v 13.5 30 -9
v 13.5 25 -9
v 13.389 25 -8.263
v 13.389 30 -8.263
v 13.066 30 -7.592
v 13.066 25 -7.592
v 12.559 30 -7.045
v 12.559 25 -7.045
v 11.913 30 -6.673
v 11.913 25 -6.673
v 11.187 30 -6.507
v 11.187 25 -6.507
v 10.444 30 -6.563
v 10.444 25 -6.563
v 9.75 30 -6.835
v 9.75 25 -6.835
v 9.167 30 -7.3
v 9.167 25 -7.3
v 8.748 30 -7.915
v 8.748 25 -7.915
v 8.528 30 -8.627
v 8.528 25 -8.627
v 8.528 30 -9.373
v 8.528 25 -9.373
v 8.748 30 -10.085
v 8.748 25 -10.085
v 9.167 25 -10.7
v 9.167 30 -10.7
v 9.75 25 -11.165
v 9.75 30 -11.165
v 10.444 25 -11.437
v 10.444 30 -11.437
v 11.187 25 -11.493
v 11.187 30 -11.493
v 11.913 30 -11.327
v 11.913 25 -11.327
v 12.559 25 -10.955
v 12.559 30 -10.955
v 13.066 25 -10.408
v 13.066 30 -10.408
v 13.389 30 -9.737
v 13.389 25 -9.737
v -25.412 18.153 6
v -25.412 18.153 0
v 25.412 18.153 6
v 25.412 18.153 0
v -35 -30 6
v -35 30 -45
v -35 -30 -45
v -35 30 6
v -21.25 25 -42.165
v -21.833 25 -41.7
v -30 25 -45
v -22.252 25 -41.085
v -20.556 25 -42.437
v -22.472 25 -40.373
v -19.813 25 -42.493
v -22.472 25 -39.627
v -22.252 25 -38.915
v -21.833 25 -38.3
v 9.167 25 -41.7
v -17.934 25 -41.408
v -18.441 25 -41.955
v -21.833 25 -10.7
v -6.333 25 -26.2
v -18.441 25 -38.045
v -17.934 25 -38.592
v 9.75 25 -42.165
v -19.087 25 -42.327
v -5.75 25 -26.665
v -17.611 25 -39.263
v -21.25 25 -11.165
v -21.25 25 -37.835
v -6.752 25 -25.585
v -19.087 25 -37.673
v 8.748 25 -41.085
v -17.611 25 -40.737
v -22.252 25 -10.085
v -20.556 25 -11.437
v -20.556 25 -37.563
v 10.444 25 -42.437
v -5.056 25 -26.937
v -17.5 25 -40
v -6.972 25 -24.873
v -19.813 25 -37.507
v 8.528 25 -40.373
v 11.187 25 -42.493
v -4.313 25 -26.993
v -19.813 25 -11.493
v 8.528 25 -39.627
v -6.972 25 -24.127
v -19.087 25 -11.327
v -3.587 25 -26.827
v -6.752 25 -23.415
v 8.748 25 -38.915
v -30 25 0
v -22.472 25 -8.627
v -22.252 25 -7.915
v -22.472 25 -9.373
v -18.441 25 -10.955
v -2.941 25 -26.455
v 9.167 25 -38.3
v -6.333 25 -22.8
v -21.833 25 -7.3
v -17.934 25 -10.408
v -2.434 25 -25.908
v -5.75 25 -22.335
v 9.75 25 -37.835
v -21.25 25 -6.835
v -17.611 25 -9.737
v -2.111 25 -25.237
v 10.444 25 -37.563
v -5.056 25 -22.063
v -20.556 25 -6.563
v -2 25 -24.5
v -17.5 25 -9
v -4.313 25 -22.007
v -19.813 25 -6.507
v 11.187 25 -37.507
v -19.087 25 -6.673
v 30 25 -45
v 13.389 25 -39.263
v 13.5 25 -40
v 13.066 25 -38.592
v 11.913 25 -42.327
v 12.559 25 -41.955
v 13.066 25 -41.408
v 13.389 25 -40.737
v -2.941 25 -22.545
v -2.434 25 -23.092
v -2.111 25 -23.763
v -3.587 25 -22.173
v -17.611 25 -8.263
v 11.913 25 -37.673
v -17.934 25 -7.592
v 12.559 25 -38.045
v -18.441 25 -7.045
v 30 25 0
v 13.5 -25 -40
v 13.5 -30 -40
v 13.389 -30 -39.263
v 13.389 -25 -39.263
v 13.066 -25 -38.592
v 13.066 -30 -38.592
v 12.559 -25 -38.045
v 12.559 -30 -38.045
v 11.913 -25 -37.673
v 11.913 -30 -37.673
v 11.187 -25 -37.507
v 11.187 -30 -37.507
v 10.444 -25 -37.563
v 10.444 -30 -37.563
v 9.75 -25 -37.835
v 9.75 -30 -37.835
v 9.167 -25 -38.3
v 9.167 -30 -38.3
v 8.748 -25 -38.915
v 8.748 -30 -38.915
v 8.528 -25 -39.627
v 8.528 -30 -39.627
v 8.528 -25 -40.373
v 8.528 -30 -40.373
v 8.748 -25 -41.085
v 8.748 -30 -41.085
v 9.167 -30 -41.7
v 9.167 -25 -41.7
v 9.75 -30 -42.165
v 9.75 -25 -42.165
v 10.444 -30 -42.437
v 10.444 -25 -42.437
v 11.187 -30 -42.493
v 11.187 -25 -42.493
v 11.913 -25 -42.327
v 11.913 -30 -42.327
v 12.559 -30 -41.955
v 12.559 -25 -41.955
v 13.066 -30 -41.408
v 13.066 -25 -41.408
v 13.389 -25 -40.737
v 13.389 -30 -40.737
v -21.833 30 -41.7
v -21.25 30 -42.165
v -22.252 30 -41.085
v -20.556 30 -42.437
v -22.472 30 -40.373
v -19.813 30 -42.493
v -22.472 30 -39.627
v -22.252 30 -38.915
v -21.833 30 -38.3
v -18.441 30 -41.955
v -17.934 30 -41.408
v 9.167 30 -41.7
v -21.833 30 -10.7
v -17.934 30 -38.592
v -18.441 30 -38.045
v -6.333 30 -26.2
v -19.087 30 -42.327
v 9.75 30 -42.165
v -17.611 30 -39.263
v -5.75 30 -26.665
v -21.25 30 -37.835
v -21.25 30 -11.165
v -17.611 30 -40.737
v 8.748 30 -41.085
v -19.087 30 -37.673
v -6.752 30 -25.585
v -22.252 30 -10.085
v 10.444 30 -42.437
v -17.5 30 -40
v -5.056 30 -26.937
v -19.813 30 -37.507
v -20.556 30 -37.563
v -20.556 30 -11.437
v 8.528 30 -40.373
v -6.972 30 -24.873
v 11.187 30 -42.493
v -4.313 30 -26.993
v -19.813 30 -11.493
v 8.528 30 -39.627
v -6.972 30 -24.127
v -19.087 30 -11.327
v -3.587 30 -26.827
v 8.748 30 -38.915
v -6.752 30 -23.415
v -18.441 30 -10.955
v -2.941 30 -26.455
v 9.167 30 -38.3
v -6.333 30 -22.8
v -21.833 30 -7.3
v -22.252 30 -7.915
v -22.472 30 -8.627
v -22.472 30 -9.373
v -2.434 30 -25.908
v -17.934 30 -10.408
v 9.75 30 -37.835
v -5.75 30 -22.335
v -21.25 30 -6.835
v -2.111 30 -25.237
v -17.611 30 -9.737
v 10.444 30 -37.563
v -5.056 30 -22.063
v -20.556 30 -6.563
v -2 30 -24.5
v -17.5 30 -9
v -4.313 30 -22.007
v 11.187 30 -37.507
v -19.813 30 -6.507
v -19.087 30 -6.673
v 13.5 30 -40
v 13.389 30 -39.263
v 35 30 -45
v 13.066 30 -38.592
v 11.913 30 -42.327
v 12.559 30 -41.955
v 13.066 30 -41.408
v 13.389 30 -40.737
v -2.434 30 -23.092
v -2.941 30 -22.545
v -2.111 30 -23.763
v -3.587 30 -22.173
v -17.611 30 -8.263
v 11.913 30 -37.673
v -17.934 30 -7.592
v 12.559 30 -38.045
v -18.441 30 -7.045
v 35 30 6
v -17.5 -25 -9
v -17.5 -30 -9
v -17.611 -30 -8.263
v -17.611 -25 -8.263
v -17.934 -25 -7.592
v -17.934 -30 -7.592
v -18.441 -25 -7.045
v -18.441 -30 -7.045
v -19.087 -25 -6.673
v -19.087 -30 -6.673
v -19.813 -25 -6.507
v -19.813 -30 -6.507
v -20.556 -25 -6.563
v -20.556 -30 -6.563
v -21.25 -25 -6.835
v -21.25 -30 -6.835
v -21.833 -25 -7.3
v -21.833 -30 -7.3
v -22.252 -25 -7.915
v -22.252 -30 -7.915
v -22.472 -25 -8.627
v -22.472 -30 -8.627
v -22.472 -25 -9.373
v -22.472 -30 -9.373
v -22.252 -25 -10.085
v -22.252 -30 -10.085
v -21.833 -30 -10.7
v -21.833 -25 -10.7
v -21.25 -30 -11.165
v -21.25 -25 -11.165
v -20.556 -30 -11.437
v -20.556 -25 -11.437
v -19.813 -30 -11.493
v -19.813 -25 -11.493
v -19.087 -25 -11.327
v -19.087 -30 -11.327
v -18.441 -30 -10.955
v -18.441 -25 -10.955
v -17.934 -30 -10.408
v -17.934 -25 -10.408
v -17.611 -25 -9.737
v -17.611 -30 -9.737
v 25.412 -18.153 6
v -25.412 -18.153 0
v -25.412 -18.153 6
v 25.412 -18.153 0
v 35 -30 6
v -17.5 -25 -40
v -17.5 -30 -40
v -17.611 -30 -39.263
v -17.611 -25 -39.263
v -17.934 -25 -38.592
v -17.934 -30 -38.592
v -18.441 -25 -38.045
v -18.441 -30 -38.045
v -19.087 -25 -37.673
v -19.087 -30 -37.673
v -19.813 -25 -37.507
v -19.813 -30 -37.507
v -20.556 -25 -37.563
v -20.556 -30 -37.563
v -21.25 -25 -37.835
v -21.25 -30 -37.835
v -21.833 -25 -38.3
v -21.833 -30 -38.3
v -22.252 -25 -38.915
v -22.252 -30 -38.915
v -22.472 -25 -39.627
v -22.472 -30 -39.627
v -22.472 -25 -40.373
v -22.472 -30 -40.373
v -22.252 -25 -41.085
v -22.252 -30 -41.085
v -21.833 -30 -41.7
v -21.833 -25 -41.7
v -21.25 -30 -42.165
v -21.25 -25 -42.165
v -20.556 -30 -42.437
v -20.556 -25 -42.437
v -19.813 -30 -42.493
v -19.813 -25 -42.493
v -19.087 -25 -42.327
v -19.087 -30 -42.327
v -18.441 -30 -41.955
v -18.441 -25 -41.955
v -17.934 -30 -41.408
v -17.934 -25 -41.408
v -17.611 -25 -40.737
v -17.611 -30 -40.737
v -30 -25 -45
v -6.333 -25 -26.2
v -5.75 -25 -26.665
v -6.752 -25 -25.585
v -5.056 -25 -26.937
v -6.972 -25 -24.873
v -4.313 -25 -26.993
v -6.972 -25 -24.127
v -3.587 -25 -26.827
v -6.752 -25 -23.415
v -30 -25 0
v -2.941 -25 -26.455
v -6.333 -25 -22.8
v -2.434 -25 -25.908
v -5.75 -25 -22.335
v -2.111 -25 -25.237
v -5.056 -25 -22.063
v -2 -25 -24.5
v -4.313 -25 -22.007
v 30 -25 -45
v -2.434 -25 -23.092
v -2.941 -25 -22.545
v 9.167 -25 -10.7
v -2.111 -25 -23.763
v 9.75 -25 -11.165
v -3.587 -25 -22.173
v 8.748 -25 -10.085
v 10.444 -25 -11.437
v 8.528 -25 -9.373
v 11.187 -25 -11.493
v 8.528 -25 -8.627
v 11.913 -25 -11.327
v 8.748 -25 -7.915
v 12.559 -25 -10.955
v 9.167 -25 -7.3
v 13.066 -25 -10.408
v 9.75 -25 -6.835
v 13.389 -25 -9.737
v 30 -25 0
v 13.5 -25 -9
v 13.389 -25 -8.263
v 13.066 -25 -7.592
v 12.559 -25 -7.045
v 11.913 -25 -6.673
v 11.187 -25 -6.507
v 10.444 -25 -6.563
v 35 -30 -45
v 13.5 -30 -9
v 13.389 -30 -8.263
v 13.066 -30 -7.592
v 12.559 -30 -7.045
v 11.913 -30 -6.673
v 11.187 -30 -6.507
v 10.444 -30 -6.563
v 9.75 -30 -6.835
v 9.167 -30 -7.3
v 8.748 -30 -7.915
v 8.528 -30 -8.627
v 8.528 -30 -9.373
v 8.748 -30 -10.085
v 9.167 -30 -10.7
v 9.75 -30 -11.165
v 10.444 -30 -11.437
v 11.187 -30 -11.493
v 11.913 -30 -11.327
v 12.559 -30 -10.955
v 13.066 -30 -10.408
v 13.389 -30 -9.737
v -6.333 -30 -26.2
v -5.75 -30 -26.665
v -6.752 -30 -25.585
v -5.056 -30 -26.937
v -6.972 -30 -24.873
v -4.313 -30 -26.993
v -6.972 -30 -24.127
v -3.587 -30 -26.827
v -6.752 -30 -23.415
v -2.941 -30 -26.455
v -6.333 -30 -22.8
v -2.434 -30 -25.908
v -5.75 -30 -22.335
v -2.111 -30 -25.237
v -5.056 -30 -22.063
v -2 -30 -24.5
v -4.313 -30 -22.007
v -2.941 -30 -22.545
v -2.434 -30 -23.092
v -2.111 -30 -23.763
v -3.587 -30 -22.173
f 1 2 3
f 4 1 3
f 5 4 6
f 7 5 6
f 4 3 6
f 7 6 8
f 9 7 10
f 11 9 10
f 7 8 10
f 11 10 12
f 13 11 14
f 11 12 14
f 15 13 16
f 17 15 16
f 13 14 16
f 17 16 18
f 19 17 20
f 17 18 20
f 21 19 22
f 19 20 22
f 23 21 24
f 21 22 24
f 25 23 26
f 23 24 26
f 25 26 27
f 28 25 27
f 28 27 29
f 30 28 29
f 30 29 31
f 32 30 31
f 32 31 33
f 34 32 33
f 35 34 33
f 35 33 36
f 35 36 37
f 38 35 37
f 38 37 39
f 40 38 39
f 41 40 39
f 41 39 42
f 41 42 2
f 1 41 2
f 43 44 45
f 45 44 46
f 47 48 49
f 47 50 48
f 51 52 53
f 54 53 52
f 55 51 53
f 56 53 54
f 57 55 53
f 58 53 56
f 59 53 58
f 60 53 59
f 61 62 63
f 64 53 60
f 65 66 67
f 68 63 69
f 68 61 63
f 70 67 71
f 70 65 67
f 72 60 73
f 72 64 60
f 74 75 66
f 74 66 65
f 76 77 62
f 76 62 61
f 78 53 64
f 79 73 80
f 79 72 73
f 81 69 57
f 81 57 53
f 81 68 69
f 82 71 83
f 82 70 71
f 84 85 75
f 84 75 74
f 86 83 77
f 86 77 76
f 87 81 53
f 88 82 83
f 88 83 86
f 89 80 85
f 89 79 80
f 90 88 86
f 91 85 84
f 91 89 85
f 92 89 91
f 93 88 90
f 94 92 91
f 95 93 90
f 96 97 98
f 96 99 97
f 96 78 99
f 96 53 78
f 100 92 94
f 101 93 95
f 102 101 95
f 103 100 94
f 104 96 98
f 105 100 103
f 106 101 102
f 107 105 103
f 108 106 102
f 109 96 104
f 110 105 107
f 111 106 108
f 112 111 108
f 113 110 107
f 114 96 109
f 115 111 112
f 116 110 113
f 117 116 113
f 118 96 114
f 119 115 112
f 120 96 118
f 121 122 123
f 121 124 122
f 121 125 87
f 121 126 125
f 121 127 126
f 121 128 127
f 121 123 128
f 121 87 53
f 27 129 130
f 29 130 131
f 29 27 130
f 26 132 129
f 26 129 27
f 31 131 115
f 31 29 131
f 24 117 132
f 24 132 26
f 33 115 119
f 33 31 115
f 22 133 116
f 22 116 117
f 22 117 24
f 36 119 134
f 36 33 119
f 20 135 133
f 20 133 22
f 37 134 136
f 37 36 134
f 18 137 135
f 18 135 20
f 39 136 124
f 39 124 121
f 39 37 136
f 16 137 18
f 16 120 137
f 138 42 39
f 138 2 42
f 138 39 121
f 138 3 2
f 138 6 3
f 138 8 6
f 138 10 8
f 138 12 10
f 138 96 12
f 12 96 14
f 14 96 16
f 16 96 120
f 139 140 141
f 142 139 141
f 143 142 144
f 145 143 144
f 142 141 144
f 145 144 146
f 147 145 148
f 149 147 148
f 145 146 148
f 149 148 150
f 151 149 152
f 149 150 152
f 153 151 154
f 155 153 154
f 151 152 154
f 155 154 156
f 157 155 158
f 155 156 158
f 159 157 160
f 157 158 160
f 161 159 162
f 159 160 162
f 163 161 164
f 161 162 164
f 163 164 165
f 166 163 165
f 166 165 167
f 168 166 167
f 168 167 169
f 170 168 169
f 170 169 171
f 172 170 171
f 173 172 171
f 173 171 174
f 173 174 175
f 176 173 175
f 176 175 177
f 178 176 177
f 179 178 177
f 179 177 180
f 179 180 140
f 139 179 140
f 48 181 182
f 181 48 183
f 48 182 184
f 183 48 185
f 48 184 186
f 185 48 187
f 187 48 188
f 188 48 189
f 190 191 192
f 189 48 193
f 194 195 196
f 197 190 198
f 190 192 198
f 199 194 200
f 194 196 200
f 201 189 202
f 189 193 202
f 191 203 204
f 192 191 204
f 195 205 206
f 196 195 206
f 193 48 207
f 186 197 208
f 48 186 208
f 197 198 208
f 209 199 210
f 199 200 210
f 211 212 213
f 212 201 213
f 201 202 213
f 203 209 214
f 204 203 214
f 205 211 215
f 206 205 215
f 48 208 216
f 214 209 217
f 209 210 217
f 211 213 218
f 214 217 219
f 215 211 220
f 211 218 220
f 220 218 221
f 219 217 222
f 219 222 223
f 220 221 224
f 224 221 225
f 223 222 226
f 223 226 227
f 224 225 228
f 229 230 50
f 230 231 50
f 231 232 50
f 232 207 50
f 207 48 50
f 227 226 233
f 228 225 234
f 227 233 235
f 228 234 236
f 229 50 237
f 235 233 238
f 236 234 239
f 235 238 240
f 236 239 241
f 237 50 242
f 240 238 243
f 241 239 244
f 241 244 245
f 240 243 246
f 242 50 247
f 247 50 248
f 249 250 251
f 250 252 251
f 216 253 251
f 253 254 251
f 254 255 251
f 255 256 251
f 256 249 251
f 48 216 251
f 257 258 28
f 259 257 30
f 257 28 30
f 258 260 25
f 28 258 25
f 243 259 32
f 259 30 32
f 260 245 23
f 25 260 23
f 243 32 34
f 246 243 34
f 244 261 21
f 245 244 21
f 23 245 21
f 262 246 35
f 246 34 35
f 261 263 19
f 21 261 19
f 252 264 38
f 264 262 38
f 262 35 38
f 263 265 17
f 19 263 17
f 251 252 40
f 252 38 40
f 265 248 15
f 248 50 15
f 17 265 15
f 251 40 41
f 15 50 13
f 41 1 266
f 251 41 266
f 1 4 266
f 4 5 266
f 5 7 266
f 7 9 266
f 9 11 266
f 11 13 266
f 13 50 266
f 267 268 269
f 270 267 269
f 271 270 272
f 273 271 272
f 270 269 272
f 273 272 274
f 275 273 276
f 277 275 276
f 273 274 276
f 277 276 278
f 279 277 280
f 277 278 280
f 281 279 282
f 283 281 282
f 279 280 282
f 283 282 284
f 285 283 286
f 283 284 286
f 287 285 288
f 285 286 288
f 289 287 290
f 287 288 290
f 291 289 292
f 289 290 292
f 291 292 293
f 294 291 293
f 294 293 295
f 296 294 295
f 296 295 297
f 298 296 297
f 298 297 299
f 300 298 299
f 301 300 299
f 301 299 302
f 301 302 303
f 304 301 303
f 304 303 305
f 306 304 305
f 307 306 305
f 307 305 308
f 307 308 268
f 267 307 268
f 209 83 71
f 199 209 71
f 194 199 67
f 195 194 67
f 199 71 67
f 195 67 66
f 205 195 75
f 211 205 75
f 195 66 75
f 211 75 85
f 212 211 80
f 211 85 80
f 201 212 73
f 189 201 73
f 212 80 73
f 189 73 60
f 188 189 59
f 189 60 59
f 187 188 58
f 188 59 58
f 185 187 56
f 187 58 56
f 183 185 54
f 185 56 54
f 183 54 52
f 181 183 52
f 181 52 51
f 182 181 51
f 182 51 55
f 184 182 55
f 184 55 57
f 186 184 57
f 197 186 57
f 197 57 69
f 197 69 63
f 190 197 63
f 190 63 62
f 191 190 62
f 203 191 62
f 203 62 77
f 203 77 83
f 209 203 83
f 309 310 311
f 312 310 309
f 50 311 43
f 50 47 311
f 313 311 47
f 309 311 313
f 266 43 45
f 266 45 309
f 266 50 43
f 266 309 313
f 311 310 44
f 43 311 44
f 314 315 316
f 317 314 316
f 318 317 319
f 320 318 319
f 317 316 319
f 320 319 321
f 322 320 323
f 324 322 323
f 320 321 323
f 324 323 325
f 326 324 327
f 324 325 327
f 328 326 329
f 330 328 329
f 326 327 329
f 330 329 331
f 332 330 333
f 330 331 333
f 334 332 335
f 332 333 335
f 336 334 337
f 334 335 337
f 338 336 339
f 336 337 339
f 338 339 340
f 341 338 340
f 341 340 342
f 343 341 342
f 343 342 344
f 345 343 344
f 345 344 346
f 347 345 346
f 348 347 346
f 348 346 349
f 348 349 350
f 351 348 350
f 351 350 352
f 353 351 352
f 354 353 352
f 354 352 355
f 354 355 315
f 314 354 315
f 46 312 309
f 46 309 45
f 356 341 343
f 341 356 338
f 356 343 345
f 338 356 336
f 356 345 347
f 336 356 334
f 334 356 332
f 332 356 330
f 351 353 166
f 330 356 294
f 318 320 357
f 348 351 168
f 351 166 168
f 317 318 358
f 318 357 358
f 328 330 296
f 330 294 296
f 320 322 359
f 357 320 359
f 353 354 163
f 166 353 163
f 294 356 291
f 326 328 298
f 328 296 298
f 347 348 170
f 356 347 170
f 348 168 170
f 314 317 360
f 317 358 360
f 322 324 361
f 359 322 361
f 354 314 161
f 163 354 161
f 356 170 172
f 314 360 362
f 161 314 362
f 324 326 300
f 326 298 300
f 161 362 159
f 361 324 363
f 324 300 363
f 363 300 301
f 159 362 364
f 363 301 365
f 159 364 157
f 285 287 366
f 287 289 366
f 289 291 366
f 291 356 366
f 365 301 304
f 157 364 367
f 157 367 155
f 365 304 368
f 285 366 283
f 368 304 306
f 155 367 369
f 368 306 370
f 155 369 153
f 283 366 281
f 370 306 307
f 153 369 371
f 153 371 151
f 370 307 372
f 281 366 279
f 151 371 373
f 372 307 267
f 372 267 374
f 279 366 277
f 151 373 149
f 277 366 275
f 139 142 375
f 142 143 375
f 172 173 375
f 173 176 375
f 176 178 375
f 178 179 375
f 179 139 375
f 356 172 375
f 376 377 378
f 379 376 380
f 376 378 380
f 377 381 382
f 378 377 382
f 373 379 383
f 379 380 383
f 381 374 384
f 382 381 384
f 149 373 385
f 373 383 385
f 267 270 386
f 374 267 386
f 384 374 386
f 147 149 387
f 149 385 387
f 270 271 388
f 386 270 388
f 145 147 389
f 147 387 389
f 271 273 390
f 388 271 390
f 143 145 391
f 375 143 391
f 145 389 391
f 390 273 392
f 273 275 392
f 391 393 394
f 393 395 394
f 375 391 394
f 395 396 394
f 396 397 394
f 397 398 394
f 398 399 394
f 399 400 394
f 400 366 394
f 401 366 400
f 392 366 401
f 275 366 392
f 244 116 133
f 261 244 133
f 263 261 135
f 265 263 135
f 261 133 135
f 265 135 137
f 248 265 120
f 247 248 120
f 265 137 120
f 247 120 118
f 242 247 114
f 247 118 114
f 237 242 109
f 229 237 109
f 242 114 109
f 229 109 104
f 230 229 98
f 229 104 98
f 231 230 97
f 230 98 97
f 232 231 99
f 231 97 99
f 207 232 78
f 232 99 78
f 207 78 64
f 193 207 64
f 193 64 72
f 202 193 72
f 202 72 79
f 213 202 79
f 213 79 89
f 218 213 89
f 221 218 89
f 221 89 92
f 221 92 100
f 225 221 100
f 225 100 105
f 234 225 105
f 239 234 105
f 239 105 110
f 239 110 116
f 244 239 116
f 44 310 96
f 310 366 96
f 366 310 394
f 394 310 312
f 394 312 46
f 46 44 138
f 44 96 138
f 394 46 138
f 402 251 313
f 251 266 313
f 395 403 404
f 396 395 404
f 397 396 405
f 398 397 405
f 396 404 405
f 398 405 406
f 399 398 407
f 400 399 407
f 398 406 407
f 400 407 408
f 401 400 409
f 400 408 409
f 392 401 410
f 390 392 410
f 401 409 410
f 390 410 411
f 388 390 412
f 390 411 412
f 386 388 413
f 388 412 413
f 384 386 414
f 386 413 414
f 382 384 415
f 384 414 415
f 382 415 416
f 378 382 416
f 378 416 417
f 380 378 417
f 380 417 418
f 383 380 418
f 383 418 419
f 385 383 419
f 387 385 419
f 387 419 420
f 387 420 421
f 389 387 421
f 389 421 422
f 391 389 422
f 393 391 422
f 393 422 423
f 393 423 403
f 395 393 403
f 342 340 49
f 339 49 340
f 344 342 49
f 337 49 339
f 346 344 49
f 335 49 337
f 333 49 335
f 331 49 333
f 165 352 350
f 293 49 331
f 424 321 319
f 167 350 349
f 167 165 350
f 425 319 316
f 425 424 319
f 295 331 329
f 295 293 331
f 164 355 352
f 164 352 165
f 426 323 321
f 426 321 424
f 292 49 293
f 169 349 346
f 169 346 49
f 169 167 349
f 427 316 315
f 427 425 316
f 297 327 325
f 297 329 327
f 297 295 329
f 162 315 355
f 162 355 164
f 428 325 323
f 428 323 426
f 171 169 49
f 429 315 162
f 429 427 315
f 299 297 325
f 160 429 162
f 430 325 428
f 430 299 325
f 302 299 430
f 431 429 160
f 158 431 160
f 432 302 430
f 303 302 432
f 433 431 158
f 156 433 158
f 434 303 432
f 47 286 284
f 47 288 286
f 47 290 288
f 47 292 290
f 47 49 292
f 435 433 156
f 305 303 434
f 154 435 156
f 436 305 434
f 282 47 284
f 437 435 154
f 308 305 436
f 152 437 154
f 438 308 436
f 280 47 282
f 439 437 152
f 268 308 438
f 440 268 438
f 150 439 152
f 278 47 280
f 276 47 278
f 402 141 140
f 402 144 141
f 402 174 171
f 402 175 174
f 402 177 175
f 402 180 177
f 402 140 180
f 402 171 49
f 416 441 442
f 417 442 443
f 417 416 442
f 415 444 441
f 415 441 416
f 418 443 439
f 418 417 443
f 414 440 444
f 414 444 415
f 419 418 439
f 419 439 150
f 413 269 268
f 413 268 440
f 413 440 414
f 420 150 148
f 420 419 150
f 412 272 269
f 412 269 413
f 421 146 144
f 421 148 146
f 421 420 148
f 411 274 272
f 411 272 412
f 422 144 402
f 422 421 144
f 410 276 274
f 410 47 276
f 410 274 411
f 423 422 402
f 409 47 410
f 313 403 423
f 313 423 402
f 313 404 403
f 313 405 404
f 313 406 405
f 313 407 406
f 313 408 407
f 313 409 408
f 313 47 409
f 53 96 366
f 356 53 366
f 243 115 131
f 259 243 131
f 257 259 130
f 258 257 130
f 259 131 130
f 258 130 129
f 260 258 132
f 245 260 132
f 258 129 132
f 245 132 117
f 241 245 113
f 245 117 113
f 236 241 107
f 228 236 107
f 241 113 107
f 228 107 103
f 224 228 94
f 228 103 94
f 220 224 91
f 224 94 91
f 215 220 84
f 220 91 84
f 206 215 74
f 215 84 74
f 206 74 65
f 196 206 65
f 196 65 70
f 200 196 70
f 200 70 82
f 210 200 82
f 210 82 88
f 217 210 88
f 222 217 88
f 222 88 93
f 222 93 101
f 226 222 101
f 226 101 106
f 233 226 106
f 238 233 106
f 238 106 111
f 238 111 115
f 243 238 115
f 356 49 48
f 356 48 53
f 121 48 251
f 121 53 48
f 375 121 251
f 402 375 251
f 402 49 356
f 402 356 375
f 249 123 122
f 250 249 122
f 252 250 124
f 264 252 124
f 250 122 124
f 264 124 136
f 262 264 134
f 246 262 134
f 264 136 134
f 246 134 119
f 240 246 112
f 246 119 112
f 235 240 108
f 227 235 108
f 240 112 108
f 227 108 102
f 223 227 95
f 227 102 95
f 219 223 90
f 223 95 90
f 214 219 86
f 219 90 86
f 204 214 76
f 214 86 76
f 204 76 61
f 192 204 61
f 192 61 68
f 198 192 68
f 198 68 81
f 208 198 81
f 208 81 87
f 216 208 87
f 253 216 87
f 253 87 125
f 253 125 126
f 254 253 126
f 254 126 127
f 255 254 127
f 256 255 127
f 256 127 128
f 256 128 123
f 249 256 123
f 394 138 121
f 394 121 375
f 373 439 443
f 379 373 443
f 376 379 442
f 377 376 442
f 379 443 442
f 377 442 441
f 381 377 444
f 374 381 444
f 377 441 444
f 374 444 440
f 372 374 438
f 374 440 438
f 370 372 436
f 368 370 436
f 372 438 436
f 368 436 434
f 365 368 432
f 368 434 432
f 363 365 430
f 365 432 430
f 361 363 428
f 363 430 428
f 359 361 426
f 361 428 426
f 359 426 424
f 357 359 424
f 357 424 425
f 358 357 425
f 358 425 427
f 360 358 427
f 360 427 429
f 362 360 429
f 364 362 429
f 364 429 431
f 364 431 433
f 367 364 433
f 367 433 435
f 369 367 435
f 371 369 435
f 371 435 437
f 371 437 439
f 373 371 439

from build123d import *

# Parameters (mm, degrees)
F0_W     = 70
F0_H     = 60
F0_W_2   = 50.823688
F0_H_2   = 36.305584
F1_DEPTH = 6
F2_W     = 70
F2_H     = 60
F2_W_2   = 60
F2_H_2   = 50
F3_DEPTH = 45
F5_D     = 5


with BuildPart() as f1:
    # F0 (on Top) → F1 (new body)
    with BuildSketch(Plane.XY):
        Rectangle(F0_W, F0_H)
        Rectangle(F0_W_2, F0_H_2, mode=Mode.SUBTRACT)
    extrude(amount=F1_DEPTH)

    # F2 (on face) → F3 (join)
    with BuildSketch(Plane(origin=(0, 0, 0), x_dir=(1, 0, 0), z_dir=(0, 0, -1))):
        Rectangle(F2_W, F2_H)
        Rectangle(F2_W_2, F2_H_2, mode=Mode.SUBTRACT)
    extrude(amount=F3_DEPTH)

    # F5 (through all)
    with Locations(Plane(origin=(0, 30, 0), x_dir=(-1, 0, 0), z_dir=(0, 1, 0))):
        with Locations((20, -40), (-11, -40), (4.5, -24.5), (20, -9), (-11, -9)):
            Hole(F5_D / 2)


solid = f1.part
